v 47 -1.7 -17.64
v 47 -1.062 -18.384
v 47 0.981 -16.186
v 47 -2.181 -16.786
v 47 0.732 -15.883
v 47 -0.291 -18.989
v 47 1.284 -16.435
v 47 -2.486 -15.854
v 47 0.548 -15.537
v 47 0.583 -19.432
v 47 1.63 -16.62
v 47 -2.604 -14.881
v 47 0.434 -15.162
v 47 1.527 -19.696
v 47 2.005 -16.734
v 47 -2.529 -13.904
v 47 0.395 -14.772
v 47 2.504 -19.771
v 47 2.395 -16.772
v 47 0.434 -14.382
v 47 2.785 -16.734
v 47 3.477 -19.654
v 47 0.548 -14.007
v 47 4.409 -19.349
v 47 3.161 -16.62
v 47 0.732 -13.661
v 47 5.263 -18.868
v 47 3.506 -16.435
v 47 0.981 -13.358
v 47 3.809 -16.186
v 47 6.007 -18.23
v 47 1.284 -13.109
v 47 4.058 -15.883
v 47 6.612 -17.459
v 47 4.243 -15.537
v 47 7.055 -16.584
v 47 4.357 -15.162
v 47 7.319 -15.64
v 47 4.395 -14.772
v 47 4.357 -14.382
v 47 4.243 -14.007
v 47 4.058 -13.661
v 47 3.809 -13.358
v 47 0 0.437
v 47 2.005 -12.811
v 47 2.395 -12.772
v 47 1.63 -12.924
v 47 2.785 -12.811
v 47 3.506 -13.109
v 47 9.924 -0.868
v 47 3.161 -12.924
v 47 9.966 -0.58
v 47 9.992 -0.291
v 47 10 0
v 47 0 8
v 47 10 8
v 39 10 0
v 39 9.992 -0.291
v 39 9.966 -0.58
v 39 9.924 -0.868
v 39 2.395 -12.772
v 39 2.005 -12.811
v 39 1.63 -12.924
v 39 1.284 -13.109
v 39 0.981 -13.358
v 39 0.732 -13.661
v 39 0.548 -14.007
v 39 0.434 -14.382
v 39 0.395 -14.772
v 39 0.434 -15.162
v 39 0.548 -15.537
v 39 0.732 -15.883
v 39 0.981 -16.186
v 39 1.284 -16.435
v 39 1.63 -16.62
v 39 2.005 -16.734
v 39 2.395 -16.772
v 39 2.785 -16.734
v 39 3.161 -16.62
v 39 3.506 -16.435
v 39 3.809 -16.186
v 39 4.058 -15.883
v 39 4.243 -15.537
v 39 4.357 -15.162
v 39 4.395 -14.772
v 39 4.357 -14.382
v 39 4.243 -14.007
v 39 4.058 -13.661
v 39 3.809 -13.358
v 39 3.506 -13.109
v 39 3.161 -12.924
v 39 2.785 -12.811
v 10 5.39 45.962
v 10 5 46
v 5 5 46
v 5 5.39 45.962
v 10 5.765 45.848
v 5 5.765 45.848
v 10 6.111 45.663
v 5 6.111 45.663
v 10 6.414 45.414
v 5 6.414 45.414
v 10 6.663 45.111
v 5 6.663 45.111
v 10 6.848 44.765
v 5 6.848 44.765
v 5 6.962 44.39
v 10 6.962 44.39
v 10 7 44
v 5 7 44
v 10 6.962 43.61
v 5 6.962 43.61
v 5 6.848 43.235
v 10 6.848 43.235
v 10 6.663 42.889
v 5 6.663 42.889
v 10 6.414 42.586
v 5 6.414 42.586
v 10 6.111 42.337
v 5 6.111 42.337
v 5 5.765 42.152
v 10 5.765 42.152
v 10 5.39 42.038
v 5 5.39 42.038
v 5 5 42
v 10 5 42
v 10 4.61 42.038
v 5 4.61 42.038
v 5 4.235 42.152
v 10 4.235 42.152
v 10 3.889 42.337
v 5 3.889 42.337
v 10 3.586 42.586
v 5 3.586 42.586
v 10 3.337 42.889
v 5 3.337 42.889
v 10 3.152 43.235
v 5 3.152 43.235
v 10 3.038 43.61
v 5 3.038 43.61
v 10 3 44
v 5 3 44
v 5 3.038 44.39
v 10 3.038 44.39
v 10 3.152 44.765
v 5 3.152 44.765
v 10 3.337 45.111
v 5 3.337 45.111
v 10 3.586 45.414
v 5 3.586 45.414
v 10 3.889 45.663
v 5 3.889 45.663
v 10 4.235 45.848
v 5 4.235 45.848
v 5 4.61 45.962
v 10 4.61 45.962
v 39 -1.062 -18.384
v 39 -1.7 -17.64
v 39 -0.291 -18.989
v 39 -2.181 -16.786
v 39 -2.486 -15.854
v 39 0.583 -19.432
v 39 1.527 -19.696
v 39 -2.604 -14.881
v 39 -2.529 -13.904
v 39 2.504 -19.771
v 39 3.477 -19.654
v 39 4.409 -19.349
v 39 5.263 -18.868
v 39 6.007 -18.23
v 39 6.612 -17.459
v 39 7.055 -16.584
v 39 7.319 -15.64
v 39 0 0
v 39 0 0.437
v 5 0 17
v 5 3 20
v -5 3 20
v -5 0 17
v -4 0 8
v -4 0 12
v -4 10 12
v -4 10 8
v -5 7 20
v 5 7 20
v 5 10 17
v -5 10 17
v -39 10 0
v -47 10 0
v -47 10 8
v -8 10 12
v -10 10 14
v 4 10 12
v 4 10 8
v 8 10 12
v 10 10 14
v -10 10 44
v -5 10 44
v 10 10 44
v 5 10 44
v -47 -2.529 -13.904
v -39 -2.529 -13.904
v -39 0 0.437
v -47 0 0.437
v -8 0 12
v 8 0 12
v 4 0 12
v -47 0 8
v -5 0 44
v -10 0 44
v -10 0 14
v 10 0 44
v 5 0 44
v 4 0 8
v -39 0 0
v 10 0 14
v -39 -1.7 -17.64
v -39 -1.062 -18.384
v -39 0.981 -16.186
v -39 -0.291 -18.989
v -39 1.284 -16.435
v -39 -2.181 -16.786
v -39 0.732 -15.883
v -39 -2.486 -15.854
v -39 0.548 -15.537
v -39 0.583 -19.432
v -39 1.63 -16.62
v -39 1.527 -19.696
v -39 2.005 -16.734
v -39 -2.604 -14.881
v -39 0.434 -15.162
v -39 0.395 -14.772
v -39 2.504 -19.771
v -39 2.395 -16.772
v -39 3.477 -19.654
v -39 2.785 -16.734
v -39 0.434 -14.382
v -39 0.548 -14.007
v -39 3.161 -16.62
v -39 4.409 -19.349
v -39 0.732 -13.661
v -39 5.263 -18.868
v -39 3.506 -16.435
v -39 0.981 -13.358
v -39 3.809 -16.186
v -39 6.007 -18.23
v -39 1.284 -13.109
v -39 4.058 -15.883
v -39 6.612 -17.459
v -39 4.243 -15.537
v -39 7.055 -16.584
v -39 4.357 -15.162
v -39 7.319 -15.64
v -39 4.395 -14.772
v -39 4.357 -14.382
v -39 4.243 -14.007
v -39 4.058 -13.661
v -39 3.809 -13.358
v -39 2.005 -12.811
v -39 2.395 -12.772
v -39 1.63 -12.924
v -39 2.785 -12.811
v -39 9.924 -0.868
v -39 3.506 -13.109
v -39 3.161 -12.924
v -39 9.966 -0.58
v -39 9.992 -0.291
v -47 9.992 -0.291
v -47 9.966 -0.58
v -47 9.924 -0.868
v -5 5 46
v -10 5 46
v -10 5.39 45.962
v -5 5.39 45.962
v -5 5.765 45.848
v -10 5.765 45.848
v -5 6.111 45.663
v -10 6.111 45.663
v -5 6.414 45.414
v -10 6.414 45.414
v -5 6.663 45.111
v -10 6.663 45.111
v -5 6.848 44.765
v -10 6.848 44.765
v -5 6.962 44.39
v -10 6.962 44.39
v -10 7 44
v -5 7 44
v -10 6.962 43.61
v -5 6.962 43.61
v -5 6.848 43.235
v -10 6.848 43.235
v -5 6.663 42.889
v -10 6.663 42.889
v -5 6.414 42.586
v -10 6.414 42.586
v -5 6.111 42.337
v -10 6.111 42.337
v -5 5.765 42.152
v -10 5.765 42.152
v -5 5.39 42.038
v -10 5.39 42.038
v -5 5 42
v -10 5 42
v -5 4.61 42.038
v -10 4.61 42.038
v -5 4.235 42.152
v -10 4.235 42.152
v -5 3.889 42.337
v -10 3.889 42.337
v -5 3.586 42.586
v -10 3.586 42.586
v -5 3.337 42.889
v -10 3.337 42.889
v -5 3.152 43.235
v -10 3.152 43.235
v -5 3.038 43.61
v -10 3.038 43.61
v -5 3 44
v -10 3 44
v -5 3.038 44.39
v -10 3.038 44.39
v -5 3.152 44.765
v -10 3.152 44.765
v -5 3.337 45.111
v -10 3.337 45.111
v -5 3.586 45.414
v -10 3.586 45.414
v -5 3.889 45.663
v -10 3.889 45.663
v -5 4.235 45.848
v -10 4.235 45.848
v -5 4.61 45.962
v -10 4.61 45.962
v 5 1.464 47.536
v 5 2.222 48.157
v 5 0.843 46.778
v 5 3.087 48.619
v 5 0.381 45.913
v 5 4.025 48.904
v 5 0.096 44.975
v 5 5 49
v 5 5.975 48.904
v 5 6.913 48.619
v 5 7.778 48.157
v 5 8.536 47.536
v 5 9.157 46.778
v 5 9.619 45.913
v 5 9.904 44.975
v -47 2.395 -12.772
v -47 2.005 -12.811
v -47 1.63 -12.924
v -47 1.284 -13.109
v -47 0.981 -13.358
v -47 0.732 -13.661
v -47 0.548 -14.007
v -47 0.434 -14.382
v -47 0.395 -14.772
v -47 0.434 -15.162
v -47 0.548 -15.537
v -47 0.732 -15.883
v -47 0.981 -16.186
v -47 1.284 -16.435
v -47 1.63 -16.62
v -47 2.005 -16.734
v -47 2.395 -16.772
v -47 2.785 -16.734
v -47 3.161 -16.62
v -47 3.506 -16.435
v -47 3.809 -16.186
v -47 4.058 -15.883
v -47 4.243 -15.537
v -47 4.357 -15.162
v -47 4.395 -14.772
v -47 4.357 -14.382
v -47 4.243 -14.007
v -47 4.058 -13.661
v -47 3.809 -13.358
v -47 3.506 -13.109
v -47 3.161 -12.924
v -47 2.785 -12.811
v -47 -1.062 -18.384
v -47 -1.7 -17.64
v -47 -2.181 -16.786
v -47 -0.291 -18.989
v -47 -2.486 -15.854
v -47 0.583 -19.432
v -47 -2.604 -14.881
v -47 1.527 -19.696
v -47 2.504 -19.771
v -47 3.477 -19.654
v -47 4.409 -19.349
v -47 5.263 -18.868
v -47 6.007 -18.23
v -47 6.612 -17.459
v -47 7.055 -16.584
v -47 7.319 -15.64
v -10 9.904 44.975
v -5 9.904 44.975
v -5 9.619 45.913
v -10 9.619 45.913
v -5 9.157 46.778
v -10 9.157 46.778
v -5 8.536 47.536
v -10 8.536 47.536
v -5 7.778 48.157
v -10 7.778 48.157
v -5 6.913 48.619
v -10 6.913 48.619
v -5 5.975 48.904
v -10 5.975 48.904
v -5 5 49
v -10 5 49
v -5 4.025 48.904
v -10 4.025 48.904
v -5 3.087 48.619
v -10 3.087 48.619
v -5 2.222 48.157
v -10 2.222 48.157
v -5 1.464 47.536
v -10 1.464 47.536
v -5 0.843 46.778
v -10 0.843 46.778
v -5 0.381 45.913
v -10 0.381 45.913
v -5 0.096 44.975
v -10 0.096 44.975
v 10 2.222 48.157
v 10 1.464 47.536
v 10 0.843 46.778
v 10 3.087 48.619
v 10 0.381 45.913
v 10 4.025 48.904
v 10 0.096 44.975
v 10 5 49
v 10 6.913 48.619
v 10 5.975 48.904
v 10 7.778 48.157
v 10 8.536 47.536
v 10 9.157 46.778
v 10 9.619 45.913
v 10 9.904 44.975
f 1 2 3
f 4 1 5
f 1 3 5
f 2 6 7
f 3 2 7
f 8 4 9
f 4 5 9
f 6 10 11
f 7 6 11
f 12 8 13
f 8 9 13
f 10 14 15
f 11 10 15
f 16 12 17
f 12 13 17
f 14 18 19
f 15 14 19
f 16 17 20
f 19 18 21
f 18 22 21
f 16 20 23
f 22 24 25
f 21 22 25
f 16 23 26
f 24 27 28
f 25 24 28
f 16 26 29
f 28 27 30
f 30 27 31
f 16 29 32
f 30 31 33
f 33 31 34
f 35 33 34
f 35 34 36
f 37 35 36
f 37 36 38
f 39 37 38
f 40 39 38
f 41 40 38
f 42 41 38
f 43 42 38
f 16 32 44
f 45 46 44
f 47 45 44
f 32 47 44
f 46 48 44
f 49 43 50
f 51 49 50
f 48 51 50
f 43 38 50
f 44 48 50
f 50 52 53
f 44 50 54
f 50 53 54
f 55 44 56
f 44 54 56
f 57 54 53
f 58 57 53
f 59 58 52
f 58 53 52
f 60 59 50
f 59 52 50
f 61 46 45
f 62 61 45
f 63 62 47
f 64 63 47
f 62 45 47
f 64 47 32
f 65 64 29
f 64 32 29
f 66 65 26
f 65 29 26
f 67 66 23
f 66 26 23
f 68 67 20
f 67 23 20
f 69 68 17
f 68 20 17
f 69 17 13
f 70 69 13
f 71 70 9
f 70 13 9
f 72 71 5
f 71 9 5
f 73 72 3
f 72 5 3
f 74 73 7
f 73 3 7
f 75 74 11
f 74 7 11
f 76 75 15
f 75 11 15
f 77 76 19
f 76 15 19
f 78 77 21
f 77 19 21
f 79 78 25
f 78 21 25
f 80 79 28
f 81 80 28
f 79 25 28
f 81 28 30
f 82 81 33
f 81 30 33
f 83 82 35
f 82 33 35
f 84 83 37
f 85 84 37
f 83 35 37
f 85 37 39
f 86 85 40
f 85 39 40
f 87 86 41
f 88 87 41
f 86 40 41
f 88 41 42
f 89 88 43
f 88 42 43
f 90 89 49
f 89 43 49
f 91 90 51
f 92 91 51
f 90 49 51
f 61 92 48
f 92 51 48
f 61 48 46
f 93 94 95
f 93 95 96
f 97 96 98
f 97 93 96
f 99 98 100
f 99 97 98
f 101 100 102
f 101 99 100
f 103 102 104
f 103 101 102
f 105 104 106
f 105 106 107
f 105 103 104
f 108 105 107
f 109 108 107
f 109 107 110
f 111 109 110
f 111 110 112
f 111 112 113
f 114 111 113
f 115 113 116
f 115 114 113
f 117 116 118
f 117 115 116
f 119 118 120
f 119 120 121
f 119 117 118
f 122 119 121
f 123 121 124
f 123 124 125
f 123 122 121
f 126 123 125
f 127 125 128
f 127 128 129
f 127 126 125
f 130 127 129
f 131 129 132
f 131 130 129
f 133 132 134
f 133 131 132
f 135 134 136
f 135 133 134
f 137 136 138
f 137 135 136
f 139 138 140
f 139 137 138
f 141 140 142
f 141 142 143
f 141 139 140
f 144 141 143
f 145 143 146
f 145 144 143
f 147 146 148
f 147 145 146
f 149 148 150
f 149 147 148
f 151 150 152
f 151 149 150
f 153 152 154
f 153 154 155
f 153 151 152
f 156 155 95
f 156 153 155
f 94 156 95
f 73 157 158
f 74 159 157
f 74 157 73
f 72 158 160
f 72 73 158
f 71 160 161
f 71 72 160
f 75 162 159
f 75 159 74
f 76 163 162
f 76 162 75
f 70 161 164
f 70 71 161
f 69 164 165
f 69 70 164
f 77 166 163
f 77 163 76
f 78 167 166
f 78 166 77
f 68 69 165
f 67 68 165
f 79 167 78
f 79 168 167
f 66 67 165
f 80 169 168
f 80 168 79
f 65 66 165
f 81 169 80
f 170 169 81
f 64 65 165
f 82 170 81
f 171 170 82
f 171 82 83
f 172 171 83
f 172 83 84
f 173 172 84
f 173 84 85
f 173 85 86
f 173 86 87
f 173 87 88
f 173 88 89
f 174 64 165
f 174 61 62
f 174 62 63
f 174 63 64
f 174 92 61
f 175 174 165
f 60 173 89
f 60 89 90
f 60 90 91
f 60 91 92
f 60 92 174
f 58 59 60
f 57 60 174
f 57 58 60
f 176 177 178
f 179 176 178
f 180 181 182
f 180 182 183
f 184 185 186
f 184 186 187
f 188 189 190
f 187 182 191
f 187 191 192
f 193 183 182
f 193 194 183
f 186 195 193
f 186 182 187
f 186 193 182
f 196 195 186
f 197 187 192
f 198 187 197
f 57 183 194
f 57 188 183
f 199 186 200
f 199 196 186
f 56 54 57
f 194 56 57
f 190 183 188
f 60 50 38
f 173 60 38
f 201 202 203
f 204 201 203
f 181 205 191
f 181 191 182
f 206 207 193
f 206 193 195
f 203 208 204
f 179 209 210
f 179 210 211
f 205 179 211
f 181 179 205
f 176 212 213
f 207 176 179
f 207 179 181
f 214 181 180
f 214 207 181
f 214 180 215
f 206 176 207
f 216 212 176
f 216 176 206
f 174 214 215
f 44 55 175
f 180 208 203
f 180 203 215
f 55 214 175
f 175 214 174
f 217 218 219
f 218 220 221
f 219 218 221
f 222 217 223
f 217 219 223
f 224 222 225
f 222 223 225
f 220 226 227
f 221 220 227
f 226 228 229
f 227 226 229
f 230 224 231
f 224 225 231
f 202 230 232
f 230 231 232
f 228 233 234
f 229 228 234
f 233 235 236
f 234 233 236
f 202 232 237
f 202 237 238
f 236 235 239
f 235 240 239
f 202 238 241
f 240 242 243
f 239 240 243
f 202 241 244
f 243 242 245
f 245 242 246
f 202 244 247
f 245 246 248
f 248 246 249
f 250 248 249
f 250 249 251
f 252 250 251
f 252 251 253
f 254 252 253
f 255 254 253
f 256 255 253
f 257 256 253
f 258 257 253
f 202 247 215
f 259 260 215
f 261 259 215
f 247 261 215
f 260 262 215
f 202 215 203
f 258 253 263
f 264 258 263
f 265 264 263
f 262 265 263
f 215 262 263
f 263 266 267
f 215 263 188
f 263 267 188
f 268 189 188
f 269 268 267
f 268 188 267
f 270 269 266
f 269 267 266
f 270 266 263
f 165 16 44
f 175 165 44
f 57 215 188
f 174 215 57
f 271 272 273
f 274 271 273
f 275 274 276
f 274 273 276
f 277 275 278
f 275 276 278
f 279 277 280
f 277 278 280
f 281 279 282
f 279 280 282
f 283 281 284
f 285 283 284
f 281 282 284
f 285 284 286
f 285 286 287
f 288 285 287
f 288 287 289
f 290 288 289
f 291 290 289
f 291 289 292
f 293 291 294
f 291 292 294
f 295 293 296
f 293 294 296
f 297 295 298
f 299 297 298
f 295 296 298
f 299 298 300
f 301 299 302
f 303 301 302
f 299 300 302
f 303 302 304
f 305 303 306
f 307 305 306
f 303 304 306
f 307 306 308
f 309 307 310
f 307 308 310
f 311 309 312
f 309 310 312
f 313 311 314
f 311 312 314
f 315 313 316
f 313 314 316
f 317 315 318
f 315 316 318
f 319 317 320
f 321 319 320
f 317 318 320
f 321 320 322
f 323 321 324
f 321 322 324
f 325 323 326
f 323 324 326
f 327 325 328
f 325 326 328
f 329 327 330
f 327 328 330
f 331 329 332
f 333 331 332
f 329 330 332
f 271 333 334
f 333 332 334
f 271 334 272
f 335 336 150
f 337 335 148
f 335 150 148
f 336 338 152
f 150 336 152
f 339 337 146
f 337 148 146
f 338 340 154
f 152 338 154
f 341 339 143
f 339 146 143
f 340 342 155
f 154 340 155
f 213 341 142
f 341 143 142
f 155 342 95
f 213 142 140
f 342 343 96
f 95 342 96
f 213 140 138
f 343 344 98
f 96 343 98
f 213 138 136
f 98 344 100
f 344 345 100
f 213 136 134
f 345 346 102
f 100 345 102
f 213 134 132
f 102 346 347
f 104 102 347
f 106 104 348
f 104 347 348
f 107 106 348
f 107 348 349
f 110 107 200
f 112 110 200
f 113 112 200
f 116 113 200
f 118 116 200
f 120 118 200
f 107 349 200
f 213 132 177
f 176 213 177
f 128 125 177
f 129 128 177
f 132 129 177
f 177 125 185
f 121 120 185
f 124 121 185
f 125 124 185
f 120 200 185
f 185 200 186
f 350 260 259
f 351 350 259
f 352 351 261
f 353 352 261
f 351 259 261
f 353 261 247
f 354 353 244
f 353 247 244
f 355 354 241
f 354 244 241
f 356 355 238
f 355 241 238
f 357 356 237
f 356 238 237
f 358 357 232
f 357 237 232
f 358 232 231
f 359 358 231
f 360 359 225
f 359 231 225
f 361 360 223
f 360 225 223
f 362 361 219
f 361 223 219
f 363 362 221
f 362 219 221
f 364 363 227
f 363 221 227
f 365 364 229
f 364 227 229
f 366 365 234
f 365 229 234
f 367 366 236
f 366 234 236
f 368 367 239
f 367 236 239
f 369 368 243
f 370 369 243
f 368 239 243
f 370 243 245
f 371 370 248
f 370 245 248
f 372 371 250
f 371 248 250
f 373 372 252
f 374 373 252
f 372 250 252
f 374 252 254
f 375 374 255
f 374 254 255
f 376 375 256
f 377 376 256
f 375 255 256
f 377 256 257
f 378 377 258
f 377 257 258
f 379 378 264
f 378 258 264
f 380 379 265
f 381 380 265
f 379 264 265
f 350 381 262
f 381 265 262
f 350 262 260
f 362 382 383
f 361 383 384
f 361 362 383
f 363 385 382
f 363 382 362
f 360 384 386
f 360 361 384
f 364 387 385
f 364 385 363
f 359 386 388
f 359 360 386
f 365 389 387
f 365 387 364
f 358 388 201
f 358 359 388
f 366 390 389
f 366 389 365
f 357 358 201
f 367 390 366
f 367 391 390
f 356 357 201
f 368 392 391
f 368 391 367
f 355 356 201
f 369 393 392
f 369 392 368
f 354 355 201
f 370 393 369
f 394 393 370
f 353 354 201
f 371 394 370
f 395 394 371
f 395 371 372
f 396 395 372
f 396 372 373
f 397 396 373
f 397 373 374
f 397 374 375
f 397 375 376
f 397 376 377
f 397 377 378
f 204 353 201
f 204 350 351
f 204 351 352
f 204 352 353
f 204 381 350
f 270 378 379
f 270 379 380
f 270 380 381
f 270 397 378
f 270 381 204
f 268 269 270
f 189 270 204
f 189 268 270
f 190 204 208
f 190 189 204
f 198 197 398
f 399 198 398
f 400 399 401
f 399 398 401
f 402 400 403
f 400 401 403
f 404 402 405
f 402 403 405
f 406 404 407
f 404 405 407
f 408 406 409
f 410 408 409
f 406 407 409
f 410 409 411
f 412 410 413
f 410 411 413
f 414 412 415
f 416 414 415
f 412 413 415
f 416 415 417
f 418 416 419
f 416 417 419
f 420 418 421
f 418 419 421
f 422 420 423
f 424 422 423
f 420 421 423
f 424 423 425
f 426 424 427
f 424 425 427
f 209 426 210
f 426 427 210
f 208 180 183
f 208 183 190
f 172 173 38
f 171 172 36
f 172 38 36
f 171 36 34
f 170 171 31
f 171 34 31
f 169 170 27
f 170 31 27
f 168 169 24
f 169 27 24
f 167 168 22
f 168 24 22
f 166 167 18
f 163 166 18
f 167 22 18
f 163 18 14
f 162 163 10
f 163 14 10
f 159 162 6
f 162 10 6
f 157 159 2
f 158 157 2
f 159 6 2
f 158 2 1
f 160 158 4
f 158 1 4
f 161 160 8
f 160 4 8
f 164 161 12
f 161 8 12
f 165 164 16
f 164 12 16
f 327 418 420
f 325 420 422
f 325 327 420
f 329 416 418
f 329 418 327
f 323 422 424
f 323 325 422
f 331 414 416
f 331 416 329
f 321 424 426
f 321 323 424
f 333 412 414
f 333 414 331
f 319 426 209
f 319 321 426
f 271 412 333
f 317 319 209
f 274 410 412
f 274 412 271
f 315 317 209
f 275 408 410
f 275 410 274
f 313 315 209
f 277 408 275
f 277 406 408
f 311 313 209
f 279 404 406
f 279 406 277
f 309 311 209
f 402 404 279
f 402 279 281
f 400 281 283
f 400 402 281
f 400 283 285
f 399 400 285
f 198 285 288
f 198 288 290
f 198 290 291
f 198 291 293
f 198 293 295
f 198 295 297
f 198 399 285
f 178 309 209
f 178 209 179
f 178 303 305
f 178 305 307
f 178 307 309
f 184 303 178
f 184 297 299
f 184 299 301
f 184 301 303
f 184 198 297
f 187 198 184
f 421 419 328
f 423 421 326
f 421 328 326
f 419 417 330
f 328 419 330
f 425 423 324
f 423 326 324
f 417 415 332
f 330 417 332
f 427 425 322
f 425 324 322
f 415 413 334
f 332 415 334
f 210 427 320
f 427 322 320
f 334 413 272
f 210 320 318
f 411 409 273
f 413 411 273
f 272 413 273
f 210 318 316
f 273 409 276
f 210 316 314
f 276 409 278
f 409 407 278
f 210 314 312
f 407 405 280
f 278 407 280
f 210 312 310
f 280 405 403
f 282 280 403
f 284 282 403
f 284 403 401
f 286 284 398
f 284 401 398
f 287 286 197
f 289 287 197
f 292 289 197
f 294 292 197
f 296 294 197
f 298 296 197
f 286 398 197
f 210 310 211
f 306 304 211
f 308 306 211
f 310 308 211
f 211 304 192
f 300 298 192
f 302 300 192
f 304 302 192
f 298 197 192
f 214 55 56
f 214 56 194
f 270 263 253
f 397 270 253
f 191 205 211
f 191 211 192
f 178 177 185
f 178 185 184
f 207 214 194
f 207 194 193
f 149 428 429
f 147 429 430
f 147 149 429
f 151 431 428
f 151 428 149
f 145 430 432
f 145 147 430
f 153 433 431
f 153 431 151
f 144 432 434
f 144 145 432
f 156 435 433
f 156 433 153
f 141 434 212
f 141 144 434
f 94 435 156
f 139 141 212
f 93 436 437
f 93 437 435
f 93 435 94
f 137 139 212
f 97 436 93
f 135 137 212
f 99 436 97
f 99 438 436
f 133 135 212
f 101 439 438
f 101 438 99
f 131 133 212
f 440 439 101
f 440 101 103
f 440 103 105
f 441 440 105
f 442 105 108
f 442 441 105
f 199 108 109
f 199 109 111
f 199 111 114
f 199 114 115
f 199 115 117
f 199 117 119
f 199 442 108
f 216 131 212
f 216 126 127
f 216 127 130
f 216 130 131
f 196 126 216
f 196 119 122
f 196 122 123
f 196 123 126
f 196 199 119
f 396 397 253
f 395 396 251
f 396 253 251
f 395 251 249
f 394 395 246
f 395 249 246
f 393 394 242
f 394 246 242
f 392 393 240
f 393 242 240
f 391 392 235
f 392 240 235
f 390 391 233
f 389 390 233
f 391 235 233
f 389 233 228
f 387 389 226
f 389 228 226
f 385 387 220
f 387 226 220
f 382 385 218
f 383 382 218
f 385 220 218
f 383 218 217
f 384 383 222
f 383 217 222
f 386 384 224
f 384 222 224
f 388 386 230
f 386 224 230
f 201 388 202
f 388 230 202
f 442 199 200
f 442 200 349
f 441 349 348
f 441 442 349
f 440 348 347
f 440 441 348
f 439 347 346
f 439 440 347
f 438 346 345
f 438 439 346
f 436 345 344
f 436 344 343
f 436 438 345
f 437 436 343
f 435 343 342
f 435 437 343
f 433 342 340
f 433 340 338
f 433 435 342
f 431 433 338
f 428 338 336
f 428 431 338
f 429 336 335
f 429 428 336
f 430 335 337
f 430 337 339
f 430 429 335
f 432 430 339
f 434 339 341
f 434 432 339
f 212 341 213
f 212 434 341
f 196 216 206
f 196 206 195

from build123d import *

# Parameters (mm, degrees)
EXTRUDE_1_DEPTH = 10
EXTRUDE_START   = 47
SKETCH_6_R      = 2
EXTRUDE_2_DEPTH = 8
EXTRUDE_START_2 = -39
SKETCH_6_2_R    = 2
EXTRUDE_3_DEPTH = 8
CHAMFER_2_SIZE  = 2
SKETCH_7_R      = 2
EXTRUDE_4_DEPTH = 5
CHAMFER_3_SIZE  = 3


with BuildPart() as part:
    # 草图1 → 凸台-拉伸1 (new body)
    with BuildSketch(Plane(origin=(0, 0, 0), x_dir=(1, 0, 0), z_dir=(0, 1, 0))):
        Polygon((-47, 0), (47, 0), (47, -8), (4, -8), (4, -12), (10, -12), (10, -20), (-10, -20), (-10, -12), (-4, -12), (-4, -8), (-47, -8), align=None)
    extrude(amount=EXTRUDE_1_DEPTH)

    # 草图6 → 凸台-拉伸2 (add)
    with BuildSketch(Plane(origin=(0, 0, 0), x_dir=(0, 0, -1), z_dir=(1, 0, 0)).offset(EXTRUDE_START)):
        with BuildLine():
            Line((0.868240888, 9.924038765), (15.640357184, 7.3193161))
            ThreePointArc((15.640357184, 7.3193161), (19.69615506, 1.527036447), (13.903875407, -2.52876143))
            Line((13.903875407, -2.52876143), (-0.868240888, 0.075961235))
            ThreePointArc((-0.868240888, 0.075961235), (-4.924038765, 5.868240888), (0.868240888, 9.924038765))
        make_face()
        with Locations(Location((14.772116295, 2.395277335, 0), (0, 0, 180))):
            Circle(SKETCH_6_R, mode=Mode.SUBTRACT)
    extrude(amount=-EXTRUDE_2_DEPTH)

    # 草图6<2> → 凸台-拉伸3 (add)
    with BuildSketch(Plane(origin=(0, 0, 0), x_dir=(0, 0, -1), z_dir=(1, 0, 0)).offset(EXTRUDE_START_2)):
        with BuildLine():
            Line((0.868240888, 9.924038765), (15.640357184, 7.3193161))
            ThreePointArc((15.640357184, 7.3193161), (19.69615506, 1.527036447), (13.903875407, -2.52876143))
            Line((13.903875407, -2.52876143), (-0.868240888, 0.075961235))
            ThreePointArc((-0.868240888, 0.075961235), (-4.924038765, 5.868240888), (0.868240888, 9.924038765))
        make_face()
        with Locations(Location((14.772116295, 2.395277335, 0), (0, 0, 180))):
            Circle(SKETCH_6_2_R, mode=Mode.SUBTRACT)
    extrude(amount=-EXTRUDE_3_DEPTH)

    # 倒角2
    chamfer_2_edges = [part.edges().sort_by_distance(p)[0] for p in [
        (10, 5, 12),
        (-10, 5, 12),
    ]]
    chamfer(chamfer_2_edges, length=CHAMFER_2_SIZE)

    # 草图7 → 凸台-拉伸4 (add)
    with BuildSketch(Plane.ZY.offset(10)):
        with BuildLine():
            Line((20, 10), (44, 10))
            ThreePointArc((44, 10), (49, 5), (44, 0))
            Line((44, 0), (20, 0))
            ThreePointArc((20, 0), (15, 5), (20, 10))
        make_face()
        with Locations((44, 5)):
            Circle(SKETCH_7_R, mode=Mode.SUBTRACT)
    extrude_4 = extrude(amount=-EXTRUDE_4_DEPTH)

    # 镜向1: 凸台-拉伸4 across plane
    add(extrude_4.mirror(Plane(origin=(0, 0, 0), x_dir=(0, 0, 1), z_dir=(1, 0, 0))))

    # 倒角3
    chamfer_3_edges = [part.edges().sort_by_distance(p)[0] for p in [
        (0, 0, 20),
        (0, 10, 20),
    ]]
    chamfer(chamfer_3_edges, length=CHAMFER_3_SIZE)


solid = part.part
